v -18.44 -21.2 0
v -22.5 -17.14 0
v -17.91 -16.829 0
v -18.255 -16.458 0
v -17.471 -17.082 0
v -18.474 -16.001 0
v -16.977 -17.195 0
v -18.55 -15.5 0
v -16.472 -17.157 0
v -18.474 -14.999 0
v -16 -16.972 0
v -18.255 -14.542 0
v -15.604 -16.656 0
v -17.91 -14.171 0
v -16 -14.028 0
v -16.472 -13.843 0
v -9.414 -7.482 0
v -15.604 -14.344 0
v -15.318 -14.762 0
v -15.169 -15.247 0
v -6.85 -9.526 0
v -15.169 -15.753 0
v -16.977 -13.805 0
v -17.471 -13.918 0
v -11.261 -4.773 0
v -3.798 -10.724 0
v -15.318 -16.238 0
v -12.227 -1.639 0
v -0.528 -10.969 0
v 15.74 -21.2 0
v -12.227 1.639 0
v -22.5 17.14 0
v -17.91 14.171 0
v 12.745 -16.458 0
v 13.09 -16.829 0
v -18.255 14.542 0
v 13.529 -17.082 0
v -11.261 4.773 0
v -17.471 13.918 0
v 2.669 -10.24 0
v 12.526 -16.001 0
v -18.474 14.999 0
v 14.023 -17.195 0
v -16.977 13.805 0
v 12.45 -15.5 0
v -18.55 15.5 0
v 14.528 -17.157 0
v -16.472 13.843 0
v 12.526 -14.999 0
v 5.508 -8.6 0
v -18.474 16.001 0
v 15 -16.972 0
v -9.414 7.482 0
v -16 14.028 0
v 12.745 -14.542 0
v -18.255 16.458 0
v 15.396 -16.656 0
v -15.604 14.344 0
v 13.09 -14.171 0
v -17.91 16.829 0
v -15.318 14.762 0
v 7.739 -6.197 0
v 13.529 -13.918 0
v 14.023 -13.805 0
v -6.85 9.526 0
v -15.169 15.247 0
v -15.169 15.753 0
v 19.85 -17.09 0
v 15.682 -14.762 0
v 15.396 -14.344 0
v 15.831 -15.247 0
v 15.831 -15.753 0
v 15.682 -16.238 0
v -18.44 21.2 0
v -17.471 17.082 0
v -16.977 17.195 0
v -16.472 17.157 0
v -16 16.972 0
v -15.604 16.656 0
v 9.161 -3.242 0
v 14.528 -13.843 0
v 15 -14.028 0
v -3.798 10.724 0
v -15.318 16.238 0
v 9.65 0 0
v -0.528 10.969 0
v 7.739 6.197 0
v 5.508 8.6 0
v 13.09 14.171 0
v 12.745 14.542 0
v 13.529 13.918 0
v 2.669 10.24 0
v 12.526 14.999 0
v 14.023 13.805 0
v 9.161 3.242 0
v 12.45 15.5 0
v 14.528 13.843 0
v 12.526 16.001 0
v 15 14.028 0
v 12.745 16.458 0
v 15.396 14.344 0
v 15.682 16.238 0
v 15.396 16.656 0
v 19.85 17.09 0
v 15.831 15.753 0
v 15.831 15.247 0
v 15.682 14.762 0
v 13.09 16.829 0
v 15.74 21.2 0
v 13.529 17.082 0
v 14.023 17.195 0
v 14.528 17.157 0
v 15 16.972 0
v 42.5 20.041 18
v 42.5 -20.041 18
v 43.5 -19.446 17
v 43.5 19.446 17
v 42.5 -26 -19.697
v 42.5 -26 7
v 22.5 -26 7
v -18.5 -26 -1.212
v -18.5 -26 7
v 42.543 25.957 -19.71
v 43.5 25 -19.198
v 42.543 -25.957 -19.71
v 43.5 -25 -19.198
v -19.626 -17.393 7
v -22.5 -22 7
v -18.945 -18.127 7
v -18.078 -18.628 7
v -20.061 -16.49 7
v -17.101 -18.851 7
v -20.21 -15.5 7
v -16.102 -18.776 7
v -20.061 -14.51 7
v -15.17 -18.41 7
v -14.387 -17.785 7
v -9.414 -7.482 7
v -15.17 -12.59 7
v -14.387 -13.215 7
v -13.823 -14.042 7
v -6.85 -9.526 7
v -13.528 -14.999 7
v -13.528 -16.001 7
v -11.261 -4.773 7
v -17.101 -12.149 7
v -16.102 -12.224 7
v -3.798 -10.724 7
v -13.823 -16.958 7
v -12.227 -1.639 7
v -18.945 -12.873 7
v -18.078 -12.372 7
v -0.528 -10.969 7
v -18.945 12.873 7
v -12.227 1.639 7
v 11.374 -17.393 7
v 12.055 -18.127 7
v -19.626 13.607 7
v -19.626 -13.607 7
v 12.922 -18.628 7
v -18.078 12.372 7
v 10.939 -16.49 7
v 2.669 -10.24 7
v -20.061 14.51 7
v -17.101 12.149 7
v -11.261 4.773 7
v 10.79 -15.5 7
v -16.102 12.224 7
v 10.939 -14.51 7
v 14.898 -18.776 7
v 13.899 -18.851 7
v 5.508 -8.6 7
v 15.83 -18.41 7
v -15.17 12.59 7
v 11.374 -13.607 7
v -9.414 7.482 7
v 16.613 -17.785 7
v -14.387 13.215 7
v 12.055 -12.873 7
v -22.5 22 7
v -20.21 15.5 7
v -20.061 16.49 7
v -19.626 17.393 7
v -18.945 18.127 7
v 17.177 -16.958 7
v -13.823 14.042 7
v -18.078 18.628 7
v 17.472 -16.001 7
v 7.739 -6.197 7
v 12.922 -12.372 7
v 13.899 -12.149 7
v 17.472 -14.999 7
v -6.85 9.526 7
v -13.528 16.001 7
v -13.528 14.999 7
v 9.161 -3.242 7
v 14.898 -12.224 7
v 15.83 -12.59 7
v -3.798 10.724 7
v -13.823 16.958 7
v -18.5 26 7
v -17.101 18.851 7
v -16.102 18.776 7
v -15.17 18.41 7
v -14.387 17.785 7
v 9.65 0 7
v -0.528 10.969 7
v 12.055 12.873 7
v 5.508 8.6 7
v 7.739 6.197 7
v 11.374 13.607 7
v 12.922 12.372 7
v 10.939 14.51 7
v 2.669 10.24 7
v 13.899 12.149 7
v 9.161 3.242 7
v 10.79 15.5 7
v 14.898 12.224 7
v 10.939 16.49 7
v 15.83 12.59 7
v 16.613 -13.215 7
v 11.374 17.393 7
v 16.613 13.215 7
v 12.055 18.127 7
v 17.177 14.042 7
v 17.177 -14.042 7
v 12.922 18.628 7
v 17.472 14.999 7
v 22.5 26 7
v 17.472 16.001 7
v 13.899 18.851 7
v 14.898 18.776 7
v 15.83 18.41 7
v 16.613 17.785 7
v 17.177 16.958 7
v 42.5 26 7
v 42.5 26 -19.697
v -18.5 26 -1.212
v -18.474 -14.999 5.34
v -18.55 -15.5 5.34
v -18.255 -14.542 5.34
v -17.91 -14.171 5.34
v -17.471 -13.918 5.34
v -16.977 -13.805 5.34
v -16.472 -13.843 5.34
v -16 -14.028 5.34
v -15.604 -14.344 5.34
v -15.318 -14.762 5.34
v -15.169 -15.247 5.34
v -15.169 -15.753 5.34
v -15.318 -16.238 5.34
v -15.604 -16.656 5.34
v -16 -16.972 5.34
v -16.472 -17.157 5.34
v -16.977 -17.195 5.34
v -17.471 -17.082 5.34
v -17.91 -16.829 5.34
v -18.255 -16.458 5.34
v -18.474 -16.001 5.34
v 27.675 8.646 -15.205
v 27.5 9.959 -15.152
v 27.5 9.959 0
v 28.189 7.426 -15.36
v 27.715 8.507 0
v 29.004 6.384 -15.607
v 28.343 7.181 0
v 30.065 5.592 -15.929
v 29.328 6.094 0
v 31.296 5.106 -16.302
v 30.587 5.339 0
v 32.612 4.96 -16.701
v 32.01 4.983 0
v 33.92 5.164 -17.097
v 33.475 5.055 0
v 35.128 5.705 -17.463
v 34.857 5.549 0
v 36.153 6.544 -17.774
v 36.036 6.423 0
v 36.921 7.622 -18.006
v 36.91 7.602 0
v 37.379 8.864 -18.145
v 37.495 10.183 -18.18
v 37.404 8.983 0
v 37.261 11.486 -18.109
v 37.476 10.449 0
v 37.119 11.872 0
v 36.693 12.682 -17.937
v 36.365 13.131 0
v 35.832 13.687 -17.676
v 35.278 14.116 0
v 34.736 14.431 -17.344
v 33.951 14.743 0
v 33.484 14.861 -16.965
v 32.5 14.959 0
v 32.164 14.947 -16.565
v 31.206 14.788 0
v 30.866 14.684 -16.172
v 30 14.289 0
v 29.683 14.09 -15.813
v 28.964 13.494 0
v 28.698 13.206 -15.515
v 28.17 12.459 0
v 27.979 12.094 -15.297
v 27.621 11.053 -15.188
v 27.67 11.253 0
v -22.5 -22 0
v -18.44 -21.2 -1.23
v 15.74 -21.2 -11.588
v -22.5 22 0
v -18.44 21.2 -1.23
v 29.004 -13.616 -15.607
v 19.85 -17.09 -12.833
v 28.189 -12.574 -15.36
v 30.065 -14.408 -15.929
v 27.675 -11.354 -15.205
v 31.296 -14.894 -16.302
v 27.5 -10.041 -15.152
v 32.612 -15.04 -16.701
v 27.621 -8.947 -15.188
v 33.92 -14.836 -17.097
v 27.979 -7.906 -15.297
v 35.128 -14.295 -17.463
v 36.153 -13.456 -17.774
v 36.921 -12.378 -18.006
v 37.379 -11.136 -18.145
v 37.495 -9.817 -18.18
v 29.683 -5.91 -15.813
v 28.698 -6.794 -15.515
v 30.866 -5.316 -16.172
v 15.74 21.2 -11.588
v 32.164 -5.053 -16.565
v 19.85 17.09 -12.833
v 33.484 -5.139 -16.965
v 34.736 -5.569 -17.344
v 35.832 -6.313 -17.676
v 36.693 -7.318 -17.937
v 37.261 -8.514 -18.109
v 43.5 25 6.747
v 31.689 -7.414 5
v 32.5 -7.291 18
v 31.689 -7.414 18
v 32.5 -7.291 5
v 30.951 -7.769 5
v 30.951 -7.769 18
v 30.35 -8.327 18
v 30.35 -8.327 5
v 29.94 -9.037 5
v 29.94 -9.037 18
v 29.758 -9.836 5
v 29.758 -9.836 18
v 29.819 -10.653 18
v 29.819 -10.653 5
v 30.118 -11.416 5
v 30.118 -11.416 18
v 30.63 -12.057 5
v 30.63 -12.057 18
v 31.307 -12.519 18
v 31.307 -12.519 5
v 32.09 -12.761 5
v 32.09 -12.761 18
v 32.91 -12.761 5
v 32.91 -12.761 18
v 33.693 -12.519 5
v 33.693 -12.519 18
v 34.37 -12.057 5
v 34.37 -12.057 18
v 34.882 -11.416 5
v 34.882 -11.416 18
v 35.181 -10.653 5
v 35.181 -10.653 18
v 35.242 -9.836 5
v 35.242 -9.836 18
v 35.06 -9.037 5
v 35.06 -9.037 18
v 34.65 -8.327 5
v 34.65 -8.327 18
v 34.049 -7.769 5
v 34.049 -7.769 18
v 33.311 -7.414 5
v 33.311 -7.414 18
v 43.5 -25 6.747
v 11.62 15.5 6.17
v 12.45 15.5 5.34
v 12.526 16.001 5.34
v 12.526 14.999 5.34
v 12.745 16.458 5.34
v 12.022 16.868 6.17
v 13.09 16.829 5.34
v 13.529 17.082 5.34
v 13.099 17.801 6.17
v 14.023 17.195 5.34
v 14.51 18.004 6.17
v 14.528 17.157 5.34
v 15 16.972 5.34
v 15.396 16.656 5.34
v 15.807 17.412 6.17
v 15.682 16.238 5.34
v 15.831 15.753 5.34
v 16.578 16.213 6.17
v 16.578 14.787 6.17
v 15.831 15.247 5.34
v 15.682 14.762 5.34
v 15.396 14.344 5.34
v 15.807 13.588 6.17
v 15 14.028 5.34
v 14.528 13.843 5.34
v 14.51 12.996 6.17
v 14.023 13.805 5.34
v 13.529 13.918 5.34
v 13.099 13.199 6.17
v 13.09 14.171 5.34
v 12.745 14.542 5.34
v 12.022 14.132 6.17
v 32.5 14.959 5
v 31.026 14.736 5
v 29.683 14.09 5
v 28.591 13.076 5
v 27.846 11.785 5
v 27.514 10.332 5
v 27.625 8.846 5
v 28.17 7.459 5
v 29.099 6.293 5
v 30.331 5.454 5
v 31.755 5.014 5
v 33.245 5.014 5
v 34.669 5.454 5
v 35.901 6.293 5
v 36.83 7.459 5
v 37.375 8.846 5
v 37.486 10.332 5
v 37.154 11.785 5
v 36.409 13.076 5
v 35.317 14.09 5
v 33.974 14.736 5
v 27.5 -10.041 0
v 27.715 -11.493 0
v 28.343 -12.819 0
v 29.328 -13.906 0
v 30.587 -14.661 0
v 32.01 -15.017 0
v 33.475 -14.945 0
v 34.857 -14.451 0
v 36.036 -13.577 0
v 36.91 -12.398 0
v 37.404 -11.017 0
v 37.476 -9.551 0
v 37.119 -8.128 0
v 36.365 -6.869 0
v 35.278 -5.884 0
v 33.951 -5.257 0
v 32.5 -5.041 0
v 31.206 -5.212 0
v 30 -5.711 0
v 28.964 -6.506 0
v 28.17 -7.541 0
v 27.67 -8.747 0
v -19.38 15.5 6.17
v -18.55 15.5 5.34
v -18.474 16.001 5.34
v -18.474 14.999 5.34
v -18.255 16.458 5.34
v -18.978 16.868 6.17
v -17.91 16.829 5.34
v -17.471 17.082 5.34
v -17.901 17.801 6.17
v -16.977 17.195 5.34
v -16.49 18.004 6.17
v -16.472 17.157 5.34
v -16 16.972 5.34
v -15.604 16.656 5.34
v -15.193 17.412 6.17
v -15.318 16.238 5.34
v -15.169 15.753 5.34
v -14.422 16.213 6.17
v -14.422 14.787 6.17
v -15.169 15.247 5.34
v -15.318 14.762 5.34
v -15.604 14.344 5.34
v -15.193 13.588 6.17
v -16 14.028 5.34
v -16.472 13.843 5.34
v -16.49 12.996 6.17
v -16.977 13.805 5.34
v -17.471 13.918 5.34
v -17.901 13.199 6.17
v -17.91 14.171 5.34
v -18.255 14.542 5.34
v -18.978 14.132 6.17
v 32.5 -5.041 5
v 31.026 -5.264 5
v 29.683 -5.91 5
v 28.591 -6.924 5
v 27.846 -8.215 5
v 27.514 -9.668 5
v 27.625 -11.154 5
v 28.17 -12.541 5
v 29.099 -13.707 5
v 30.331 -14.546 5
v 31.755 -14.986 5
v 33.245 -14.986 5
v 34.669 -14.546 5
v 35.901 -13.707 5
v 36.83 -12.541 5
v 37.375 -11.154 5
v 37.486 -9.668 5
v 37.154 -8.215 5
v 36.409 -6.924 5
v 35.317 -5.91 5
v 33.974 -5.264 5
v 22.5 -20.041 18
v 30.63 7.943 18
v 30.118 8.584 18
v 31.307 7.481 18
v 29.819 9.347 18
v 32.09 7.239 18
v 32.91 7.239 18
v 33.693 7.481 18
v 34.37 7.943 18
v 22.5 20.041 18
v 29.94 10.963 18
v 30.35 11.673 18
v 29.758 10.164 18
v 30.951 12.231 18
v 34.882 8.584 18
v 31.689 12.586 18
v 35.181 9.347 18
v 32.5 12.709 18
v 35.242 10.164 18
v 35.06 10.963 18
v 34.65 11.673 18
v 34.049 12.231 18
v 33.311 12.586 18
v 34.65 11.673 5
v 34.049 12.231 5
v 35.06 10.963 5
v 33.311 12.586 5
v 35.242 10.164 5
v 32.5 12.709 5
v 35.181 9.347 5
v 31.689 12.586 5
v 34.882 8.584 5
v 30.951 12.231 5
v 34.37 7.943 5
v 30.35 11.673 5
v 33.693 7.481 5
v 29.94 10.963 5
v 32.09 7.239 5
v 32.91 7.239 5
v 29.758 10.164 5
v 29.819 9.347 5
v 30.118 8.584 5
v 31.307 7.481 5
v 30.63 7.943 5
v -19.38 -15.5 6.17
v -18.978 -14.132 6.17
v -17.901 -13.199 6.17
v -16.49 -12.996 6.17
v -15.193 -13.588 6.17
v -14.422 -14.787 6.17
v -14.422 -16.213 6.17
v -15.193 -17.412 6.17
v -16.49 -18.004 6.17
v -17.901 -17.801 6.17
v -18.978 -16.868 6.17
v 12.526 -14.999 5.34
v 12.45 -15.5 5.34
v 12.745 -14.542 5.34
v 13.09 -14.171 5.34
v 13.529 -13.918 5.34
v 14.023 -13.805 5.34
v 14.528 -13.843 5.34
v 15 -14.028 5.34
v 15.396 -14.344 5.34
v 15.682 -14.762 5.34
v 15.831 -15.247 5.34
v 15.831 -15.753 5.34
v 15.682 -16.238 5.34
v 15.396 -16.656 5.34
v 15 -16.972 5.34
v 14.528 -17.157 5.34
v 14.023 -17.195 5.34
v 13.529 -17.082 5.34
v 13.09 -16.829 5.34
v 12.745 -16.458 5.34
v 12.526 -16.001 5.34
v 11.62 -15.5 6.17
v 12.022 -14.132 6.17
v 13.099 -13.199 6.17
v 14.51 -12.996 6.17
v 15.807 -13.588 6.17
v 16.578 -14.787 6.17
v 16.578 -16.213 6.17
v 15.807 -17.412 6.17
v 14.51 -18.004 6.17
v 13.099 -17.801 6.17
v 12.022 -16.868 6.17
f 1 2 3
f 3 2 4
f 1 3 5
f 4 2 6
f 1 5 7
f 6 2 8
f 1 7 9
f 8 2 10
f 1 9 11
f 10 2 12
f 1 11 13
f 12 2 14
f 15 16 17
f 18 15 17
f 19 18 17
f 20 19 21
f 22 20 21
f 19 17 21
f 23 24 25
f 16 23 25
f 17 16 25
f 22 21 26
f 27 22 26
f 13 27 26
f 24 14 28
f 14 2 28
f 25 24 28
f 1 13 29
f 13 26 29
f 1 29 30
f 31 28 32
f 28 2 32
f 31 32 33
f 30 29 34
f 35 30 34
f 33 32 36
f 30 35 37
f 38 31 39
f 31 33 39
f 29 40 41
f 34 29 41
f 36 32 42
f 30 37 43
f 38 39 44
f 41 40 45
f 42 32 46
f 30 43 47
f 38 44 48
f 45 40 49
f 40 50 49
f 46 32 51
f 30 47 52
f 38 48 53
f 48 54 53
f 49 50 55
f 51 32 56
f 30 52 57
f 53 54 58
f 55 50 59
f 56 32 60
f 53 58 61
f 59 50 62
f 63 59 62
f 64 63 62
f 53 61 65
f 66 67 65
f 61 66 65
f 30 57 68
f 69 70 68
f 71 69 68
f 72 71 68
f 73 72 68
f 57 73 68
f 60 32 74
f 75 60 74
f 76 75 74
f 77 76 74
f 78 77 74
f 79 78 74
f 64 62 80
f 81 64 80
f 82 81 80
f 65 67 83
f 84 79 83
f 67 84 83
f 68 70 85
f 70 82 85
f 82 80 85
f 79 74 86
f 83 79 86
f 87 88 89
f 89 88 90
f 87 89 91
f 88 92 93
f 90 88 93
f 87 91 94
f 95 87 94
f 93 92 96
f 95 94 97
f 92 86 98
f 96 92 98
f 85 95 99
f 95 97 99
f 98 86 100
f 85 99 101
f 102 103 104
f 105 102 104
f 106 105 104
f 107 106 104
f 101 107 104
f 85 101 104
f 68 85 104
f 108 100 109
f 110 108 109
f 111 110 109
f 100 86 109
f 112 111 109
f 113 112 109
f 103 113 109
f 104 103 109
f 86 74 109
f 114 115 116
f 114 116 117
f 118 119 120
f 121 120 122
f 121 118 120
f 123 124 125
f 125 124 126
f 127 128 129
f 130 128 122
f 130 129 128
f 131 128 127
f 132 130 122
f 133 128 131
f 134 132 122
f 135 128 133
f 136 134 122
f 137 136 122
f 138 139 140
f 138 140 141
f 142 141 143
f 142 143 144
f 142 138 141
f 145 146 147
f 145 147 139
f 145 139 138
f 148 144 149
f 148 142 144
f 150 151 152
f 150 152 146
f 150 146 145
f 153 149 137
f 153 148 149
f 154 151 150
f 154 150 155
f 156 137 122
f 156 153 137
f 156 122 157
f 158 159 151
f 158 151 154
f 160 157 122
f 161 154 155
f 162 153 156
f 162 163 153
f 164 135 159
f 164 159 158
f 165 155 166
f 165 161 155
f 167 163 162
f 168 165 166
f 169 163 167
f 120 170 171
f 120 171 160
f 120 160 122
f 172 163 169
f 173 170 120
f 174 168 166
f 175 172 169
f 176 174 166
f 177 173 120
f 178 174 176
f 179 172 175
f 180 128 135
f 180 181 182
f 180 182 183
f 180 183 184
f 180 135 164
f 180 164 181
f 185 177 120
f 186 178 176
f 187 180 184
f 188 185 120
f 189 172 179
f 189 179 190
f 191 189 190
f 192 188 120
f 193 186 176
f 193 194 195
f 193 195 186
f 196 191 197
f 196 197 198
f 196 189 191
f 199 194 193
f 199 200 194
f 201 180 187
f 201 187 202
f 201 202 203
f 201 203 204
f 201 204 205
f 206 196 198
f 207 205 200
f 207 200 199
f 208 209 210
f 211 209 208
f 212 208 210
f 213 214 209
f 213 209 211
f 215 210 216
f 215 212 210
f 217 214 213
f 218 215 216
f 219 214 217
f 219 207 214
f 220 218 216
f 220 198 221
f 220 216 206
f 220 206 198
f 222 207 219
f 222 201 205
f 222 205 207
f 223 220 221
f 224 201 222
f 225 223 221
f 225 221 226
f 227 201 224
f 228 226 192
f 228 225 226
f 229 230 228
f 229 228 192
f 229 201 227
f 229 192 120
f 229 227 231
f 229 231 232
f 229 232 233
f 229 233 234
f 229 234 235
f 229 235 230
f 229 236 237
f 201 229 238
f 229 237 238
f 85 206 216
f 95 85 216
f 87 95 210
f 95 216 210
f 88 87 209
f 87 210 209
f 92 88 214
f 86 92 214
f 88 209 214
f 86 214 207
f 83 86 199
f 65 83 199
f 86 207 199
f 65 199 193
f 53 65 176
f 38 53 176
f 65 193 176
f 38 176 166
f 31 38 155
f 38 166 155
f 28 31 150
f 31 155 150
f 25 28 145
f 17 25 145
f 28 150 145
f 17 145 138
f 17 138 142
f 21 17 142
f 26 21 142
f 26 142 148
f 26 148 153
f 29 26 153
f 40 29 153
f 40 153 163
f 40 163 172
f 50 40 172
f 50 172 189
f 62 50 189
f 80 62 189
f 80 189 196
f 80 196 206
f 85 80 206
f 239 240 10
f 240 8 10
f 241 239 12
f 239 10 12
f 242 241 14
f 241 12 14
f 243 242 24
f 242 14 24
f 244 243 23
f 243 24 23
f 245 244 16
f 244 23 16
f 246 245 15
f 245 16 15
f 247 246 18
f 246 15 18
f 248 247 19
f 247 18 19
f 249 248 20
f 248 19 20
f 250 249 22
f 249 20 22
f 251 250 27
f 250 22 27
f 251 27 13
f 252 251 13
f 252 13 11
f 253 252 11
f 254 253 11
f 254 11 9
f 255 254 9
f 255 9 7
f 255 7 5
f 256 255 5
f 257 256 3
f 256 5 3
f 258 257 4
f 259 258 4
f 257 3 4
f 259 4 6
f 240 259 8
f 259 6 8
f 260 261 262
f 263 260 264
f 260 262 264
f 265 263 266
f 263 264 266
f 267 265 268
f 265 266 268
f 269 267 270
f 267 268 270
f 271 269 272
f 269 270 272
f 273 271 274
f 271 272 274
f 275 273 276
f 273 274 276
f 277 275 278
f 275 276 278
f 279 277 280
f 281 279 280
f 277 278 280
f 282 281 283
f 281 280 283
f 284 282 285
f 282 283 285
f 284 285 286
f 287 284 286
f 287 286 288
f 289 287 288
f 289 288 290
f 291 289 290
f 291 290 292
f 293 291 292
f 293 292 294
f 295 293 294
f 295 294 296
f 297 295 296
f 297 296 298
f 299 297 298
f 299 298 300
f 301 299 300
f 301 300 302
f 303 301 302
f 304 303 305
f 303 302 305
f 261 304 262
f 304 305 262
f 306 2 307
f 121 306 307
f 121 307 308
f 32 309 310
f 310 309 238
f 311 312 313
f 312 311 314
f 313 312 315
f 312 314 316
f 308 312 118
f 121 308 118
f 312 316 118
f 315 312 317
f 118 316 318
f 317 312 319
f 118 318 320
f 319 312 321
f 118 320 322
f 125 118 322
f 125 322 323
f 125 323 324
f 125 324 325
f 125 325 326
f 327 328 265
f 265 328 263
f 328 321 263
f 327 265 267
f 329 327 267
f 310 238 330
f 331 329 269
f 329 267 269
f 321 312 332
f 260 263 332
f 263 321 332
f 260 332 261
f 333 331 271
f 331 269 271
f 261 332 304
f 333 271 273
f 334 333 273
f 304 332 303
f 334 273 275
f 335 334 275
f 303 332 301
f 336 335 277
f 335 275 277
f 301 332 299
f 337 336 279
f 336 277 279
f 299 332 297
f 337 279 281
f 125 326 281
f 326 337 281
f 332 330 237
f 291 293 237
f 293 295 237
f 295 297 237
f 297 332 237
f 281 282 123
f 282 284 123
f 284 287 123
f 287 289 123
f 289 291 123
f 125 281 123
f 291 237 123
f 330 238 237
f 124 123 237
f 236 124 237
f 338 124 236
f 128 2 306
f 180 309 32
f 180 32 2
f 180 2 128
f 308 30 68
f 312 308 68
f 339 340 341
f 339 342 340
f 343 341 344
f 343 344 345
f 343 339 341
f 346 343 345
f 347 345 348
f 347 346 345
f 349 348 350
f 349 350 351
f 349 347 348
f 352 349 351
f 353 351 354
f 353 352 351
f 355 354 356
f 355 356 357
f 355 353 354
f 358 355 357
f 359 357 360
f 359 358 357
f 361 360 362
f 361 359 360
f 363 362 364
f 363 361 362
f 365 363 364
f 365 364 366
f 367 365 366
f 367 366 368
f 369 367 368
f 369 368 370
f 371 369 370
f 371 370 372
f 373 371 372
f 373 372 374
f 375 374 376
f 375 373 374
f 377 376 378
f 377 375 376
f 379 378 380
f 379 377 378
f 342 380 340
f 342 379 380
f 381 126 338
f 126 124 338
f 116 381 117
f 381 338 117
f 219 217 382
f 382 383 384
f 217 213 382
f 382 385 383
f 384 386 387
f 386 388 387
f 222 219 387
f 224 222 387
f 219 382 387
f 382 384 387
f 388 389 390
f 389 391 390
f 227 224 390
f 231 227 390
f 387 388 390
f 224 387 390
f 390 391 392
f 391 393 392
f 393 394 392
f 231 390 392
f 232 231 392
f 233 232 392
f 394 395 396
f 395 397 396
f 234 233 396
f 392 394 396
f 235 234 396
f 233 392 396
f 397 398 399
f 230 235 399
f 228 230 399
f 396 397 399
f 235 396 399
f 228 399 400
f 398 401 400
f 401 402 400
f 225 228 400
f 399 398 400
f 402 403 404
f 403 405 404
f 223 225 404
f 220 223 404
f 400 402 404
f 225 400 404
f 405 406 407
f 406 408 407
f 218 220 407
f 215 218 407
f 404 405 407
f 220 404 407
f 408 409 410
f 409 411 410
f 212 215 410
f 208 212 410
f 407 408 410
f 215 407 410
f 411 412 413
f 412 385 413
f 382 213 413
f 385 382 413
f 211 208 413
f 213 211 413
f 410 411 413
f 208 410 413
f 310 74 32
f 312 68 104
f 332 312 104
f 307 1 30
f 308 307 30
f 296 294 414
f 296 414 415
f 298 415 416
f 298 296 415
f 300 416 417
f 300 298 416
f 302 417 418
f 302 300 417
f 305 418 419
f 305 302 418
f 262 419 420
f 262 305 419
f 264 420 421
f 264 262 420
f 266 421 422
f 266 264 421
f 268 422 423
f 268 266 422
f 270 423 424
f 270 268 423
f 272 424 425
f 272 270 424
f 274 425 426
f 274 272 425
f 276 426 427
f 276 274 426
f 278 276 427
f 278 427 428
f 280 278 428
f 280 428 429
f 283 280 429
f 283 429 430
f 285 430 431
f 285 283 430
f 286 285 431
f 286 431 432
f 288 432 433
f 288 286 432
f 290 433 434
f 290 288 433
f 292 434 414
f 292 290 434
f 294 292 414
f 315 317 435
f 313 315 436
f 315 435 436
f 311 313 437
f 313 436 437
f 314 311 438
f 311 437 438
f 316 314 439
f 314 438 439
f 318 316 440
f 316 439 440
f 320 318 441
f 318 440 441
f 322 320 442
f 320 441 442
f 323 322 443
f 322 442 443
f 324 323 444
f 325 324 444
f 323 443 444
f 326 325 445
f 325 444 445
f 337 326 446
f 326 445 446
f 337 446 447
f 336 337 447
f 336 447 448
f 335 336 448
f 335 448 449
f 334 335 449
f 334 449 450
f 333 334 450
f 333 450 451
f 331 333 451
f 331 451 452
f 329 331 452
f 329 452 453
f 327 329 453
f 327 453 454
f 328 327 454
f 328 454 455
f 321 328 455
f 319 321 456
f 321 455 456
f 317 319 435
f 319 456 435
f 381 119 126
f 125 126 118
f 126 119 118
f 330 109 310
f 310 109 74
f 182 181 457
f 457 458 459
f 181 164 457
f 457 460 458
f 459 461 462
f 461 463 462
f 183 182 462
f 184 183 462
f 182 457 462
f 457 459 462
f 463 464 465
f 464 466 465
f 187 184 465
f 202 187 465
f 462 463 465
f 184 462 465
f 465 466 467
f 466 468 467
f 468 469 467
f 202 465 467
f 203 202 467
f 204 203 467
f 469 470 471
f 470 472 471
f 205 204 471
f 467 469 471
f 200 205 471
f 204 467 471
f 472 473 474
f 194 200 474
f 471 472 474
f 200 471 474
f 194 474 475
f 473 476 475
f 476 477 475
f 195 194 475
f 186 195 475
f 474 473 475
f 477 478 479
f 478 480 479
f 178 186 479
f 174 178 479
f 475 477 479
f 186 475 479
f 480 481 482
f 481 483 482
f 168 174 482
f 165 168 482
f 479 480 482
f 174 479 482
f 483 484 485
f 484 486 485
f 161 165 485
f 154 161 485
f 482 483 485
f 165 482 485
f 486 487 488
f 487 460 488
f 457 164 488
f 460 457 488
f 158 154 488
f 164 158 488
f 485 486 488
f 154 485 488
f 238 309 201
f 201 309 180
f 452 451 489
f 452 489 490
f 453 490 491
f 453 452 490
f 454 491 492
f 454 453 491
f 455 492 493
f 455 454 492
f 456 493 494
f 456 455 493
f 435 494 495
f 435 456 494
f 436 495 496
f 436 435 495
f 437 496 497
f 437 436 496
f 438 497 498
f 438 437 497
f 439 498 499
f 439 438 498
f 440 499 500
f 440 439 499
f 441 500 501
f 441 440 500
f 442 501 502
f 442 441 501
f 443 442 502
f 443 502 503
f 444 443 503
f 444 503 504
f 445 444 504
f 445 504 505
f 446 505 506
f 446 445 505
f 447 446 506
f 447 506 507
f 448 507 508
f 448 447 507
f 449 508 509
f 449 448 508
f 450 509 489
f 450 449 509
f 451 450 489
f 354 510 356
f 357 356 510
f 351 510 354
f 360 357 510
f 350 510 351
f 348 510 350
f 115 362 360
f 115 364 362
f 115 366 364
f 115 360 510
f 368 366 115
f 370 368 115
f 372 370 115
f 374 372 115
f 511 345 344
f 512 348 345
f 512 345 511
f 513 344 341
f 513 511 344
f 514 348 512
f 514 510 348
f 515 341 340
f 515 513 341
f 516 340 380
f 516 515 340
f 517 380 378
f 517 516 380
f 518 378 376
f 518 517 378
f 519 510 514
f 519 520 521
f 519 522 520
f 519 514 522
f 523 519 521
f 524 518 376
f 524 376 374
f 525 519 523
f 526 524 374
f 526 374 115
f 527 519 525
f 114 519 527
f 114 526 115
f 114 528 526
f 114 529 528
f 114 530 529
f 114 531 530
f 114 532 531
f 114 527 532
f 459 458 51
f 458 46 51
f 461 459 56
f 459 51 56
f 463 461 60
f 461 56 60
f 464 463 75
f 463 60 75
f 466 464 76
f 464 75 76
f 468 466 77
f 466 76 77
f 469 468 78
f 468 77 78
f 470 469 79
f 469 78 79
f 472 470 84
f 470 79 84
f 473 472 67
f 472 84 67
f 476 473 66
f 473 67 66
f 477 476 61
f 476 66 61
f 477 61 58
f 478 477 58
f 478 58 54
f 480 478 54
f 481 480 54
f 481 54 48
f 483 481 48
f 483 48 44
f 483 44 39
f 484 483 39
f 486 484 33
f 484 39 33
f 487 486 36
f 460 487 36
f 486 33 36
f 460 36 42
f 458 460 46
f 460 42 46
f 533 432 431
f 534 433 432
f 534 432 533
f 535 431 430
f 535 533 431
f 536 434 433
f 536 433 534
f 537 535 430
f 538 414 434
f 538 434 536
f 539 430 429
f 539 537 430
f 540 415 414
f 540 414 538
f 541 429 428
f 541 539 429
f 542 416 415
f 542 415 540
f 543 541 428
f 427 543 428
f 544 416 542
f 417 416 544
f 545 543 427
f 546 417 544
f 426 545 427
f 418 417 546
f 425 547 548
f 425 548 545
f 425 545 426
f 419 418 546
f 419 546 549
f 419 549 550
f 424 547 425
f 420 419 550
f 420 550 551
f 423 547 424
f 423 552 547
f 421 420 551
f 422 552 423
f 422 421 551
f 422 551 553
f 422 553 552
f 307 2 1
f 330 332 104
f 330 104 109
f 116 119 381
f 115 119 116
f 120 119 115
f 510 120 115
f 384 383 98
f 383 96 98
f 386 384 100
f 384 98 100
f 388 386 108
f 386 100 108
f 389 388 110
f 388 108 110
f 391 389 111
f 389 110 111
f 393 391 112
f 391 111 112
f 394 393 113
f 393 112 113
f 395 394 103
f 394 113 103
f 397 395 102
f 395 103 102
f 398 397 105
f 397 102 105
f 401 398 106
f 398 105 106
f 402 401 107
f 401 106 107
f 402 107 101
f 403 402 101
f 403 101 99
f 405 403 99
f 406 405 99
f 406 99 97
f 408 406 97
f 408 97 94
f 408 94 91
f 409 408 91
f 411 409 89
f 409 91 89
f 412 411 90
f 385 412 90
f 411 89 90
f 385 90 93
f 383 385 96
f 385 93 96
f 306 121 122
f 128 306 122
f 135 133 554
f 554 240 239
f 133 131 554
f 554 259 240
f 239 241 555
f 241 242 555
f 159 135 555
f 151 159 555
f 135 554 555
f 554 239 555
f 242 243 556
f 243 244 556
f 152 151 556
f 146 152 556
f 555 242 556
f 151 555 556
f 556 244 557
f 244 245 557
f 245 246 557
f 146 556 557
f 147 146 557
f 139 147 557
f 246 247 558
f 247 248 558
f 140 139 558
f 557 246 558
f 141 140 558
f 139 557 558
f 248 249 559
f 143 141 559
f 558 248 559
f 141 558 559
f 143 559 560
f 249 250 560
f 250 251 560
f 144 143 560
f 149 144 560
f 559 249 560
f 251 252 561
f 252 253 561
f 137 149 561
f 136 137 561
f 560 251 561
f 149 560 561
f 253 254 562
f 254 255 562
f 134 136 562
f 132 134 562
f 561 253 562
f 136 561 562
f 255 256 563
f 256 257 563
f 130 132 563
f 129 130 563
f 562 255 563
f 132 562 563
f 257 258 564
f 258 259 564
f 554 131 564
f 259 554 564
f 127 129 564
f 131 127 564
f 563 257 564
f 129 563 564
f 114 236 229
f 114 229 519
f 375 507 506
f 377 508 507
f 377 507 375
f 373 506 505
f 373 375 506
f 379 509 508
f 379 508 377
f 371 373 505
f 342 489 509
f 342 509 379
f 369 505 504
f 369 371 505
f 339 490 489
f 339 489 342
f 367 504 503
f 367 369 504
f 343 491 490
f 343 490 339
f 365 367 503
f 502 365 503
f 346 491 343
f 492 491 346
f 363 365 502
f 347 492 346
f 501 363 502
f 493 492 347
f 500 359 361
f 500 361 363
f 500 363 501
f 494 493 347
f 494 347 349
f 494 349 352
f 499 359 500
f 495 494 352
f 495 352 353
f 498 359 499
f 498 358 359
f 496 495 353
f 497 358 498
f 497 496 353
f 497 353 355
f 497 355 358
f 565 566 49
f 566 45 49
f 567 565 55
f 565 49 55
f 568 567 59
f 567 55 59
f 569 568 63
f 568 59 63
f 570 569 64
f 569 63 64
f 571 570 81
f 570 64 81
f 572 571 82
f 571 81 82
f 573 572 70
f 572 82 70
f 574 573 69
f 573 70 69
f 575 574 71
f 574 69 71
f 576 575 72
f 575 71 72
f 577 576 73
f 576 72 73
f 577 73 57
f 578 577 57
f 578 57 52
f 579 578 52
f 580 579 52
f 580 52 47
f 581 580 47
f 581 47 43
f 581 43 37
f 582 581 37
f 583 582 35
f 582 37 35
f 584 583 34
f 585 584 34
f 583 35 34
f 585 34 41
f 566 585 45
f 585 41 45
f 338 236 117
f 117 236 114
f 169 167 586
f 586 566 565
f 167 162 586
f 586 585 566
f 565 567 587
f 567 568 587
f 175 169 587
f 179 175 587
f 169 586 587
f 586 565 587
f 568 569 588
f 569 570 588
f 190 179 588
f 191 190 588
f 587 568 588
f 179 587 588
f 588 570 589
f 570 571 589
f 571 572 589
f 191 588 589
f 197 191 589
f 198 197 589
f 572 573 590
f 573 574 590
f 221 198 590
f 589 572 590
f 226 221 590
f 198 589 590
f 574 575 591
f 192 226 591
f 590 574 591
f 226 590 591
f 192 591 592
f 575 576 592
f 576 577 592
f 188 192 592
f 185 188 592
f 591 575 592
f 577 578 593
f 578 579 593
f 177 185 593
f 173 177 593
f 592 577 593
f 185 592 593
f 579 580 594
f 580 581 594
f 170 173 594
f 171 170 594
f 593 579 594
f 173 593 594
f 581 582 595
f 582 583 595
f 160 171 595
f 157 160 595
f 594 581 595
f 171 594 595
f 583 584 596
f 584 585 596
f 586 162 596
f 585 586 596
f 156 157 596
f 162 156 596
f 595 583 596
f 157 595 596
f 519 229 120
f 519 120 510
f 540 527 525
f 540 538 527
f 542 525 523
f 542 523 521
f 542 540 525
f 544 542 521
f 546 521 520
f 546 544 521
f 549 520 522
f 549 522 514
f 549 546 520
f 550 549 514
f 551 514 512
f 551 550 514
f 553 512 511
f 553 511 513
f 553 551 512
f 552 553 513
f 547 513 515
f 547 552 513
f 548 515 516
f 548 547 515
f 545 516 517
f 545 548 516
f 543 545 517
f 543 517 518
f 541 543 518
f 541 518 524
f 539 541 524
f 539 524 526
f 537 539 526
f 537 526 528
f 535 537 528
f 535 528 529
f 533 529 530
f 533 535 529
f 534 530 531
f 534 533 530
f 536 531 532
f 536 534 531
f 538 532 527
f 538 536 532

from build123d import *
from OCP.BRepFilletAPI import BRepFilletAPI_MakeChamfer

# Parameters (mm, degrees)
BOSS_EXTRUDE2_DEPTH           = 26
SKETCH5_R                     = 11
CUT_EXTRUDE1_DEPTH            = 52.857979135
CSK_FOR_M3_SFHCS1_D           = 3.4
CSK_FOR_M3_SFHCS1_CSINK_D     = 6.72
CSK_FOR_M3_SFHCS1_CSINK_ANGLE = 90
BOSS_EXTRUDE4_DEPTH           = 52
CUT_EXTRUDE2_DEPTH            = 55.481648286
CBORE_FOR_M5_SHCS1_AT_2_COUNT = 2
CBORE_FOR_M5_SHCS1_AT_2_PITCH = 20
SKETCH13_R                    = 5
CUT_EXTRUDE3_DEPTH            = 55.481648286
CUT_EXTRUDE4_DEPTH            = 56.686623169
CHAMFER1_SIZE                 = 1
CHAMFER1_SIZE2                = 0.80190417
CHAMFER2_SIZE                 = 4


with BuildPart() as part:
    # Sketch3 → Boss-Extrude2 (new, symmetric)
    with BuildSketch(Plane(origin=(0, 0, 0), x_dir=(1, 0, 0), z_dir=(0, 1, 0))):
        Polygon((-22.5, -7), (22.5, -7), (22.5, -18), (43.5, -18), (43.5, 0), (-22.5, 0), align=None)
    extrude(amount=BOSS_EXTRUDE2_DEPTH, both=True)

    # Sketch5 → Cut-Extrude1 (cut, through all)
    with BuildSketch(Plane.XY.offset(7)):
        with Locations((-1.35, 0)):
            Circle(SKETCH5_R)
    extrude(amount=-CUT_EXTRUDE1_DEPTH, mode=Mode.SUBTRACT)

    # CSK for M3 SFHCS1 (through all)
    with Locations(Plane.XY.offset(7)):
        with Locations((-16.85, -15.5), (-16.85, 15.5), (14.15, 15.5), (14.15, -15.5)):
            CounterSinkHole(CSK_FOR_M3_SFHCS1_D / 2, CSK_FOR_M3_SFHCS1_CSINK_D / 2, counter_sink_angle=CSK_FOR_M3_SFHCS1_CSINK_ANGLE)

    # Sketch9 → Boss-Extrude4 (add)
    with BuildSketch(Plane(origin=(0, 26, 0), x_dir=(1, 0, 0), z_dir=(0, 1, 0))):
        Polygon((-22.5, 0), (43.5, 20), (43.5, 0), align=None)
    extrude(amount=-BOSS_EXTRUDE4_DEPTH)

    # Sketch10 → Cut-Extrude2 (cut, through all)
    with BuildSketch(Plane.XY):
        Polygon((19.85, -17.089832201), (19.85, 17.089832201), (15.739832201, 21.2), (-18.439832201, 21.2), (-22.55, 17.089832201), (-22.55, -17.089832201), (-18.439832201, -21.2), (15.739832201, -21.2), align=None)
    extrude(amount=-CUT_EXTRUDE2_DEPTH, mode=Mode.SUBTRACT)

    # Sketch12 → CBORE for M5 SHCS1 (revolve, cut)
    with BuildSketch(Plane(origin=(32.5, 9.958578644, 0), x_dir=(0, 1, 0), z_dir=(1, 0, 0))):
        Polygon((0, 0), (0, 18), (2.75, 18), (2.75, 5), (5, 5), (5, 0), align=None)
    cbore_for_m5_shcs1 = revolve(axis=Axis((32.5, 9.958578644, -6.35), (0, 0, 1)), mode=Mode.SUBTRACT)

    # CBORE for M5 SHCS1 at 2: CBORE for M5 SHCS1 ×2
    with Locations(*[(0, -i * CBORE_FOR_M5_SHCS1_AT_2_PITCH, 0) for i in range(1, CBORE_FOR_M5_SHCS1_AT_2_COUNT)]):
        add(cbore_for_m5_shcs1, mode=Mode.SUBTRACT)

    # Sketch13 → Cut-Extrude3 (cut, through all)
    with BuildSketch(Plane.XY):
        with Locations(Location((32.5, -10.041421356, 0), (0, 0, 180))):
            Circle(SKETCH13_R)
        with Locations(Location((32.5, 9.958578644, 0), (0, 0, 180))):
            Circle(SKETCH13_R)
    extrude(amount=-CUT_EXTRUDE3_DEPTH, mode=Mode.SUBTRACT)

    # Sketch14 → Cut-Extrude4 (cut, through all)
    with BuildSketch(Plane.ZY.offset(-22.5)):
        Polygon((7, -26), (18, -20.041421356), (18, -26), align=None)
    cut_extrude4 = extrude(amount=-CUT_EXTRUDE4_DEPTH, mode=Mode.SUBTRACT)

    # Mirror2: Cut-Extrude4 across plane
    add(cut_extrude4.mirror(Plane.ZX), mode=Mode.SUBTRACT)

    # Chamfer1: one chamfer whose edges measure the first distance from different faces: ONE call of the kernel's chamfer builder (chamfer() names one face for all edges)
    chamfer1_edges_1 = [part.edges().sort_by_distance(p)[0] for p in [
        (43.5, -26, -6.5),
        (43.5, -23.020710678, 12.5),
        (43.5, 26, -6.5),
        (43.5, 0, 18),
        (43.5, 23.020710678, 12.5),
    ]]
    chamfer1_edges_2 = [part.edges().sort_by_distance(p)[0] for p in [
        (43.5, 0, -20),
    ]]
    chamfer1_side_2 = [part.faces().sort_by_distance(p)[0] for p in [
        (21.99684701, 0.004301334, -13.483893033),
    ]]
    chamfer1 = BRepFilletAPI_MakeChamfer(part.part.solid().wrapped)
    for e in chamfer1_edges_1:
        chamfer1.Add(CHAMFER1_SIZE, e.wrapped)
    for e in chamfer1_edges_2:
        chamfer1.Add(CHAMFER1_SIZE, CHAMFER1_SIZE2, e.wrapped, chamfer1_side_2[0].wrapped)  # the first distance lies on this face
    add(Compound.cast(chamfer1.Shape()), mode=Mode.REPLACE)

    # Chamfer2
    chamfer2_edges = [part.edges().sort_by_distance(p)[0] for p in [
        (-22.5, 26, 3.5),
        (-22.5, -26, 3.5),
    ]]
    chamfer(chamfer2_edges, length=CHAMFER2_SIZE)


solid = part.part
